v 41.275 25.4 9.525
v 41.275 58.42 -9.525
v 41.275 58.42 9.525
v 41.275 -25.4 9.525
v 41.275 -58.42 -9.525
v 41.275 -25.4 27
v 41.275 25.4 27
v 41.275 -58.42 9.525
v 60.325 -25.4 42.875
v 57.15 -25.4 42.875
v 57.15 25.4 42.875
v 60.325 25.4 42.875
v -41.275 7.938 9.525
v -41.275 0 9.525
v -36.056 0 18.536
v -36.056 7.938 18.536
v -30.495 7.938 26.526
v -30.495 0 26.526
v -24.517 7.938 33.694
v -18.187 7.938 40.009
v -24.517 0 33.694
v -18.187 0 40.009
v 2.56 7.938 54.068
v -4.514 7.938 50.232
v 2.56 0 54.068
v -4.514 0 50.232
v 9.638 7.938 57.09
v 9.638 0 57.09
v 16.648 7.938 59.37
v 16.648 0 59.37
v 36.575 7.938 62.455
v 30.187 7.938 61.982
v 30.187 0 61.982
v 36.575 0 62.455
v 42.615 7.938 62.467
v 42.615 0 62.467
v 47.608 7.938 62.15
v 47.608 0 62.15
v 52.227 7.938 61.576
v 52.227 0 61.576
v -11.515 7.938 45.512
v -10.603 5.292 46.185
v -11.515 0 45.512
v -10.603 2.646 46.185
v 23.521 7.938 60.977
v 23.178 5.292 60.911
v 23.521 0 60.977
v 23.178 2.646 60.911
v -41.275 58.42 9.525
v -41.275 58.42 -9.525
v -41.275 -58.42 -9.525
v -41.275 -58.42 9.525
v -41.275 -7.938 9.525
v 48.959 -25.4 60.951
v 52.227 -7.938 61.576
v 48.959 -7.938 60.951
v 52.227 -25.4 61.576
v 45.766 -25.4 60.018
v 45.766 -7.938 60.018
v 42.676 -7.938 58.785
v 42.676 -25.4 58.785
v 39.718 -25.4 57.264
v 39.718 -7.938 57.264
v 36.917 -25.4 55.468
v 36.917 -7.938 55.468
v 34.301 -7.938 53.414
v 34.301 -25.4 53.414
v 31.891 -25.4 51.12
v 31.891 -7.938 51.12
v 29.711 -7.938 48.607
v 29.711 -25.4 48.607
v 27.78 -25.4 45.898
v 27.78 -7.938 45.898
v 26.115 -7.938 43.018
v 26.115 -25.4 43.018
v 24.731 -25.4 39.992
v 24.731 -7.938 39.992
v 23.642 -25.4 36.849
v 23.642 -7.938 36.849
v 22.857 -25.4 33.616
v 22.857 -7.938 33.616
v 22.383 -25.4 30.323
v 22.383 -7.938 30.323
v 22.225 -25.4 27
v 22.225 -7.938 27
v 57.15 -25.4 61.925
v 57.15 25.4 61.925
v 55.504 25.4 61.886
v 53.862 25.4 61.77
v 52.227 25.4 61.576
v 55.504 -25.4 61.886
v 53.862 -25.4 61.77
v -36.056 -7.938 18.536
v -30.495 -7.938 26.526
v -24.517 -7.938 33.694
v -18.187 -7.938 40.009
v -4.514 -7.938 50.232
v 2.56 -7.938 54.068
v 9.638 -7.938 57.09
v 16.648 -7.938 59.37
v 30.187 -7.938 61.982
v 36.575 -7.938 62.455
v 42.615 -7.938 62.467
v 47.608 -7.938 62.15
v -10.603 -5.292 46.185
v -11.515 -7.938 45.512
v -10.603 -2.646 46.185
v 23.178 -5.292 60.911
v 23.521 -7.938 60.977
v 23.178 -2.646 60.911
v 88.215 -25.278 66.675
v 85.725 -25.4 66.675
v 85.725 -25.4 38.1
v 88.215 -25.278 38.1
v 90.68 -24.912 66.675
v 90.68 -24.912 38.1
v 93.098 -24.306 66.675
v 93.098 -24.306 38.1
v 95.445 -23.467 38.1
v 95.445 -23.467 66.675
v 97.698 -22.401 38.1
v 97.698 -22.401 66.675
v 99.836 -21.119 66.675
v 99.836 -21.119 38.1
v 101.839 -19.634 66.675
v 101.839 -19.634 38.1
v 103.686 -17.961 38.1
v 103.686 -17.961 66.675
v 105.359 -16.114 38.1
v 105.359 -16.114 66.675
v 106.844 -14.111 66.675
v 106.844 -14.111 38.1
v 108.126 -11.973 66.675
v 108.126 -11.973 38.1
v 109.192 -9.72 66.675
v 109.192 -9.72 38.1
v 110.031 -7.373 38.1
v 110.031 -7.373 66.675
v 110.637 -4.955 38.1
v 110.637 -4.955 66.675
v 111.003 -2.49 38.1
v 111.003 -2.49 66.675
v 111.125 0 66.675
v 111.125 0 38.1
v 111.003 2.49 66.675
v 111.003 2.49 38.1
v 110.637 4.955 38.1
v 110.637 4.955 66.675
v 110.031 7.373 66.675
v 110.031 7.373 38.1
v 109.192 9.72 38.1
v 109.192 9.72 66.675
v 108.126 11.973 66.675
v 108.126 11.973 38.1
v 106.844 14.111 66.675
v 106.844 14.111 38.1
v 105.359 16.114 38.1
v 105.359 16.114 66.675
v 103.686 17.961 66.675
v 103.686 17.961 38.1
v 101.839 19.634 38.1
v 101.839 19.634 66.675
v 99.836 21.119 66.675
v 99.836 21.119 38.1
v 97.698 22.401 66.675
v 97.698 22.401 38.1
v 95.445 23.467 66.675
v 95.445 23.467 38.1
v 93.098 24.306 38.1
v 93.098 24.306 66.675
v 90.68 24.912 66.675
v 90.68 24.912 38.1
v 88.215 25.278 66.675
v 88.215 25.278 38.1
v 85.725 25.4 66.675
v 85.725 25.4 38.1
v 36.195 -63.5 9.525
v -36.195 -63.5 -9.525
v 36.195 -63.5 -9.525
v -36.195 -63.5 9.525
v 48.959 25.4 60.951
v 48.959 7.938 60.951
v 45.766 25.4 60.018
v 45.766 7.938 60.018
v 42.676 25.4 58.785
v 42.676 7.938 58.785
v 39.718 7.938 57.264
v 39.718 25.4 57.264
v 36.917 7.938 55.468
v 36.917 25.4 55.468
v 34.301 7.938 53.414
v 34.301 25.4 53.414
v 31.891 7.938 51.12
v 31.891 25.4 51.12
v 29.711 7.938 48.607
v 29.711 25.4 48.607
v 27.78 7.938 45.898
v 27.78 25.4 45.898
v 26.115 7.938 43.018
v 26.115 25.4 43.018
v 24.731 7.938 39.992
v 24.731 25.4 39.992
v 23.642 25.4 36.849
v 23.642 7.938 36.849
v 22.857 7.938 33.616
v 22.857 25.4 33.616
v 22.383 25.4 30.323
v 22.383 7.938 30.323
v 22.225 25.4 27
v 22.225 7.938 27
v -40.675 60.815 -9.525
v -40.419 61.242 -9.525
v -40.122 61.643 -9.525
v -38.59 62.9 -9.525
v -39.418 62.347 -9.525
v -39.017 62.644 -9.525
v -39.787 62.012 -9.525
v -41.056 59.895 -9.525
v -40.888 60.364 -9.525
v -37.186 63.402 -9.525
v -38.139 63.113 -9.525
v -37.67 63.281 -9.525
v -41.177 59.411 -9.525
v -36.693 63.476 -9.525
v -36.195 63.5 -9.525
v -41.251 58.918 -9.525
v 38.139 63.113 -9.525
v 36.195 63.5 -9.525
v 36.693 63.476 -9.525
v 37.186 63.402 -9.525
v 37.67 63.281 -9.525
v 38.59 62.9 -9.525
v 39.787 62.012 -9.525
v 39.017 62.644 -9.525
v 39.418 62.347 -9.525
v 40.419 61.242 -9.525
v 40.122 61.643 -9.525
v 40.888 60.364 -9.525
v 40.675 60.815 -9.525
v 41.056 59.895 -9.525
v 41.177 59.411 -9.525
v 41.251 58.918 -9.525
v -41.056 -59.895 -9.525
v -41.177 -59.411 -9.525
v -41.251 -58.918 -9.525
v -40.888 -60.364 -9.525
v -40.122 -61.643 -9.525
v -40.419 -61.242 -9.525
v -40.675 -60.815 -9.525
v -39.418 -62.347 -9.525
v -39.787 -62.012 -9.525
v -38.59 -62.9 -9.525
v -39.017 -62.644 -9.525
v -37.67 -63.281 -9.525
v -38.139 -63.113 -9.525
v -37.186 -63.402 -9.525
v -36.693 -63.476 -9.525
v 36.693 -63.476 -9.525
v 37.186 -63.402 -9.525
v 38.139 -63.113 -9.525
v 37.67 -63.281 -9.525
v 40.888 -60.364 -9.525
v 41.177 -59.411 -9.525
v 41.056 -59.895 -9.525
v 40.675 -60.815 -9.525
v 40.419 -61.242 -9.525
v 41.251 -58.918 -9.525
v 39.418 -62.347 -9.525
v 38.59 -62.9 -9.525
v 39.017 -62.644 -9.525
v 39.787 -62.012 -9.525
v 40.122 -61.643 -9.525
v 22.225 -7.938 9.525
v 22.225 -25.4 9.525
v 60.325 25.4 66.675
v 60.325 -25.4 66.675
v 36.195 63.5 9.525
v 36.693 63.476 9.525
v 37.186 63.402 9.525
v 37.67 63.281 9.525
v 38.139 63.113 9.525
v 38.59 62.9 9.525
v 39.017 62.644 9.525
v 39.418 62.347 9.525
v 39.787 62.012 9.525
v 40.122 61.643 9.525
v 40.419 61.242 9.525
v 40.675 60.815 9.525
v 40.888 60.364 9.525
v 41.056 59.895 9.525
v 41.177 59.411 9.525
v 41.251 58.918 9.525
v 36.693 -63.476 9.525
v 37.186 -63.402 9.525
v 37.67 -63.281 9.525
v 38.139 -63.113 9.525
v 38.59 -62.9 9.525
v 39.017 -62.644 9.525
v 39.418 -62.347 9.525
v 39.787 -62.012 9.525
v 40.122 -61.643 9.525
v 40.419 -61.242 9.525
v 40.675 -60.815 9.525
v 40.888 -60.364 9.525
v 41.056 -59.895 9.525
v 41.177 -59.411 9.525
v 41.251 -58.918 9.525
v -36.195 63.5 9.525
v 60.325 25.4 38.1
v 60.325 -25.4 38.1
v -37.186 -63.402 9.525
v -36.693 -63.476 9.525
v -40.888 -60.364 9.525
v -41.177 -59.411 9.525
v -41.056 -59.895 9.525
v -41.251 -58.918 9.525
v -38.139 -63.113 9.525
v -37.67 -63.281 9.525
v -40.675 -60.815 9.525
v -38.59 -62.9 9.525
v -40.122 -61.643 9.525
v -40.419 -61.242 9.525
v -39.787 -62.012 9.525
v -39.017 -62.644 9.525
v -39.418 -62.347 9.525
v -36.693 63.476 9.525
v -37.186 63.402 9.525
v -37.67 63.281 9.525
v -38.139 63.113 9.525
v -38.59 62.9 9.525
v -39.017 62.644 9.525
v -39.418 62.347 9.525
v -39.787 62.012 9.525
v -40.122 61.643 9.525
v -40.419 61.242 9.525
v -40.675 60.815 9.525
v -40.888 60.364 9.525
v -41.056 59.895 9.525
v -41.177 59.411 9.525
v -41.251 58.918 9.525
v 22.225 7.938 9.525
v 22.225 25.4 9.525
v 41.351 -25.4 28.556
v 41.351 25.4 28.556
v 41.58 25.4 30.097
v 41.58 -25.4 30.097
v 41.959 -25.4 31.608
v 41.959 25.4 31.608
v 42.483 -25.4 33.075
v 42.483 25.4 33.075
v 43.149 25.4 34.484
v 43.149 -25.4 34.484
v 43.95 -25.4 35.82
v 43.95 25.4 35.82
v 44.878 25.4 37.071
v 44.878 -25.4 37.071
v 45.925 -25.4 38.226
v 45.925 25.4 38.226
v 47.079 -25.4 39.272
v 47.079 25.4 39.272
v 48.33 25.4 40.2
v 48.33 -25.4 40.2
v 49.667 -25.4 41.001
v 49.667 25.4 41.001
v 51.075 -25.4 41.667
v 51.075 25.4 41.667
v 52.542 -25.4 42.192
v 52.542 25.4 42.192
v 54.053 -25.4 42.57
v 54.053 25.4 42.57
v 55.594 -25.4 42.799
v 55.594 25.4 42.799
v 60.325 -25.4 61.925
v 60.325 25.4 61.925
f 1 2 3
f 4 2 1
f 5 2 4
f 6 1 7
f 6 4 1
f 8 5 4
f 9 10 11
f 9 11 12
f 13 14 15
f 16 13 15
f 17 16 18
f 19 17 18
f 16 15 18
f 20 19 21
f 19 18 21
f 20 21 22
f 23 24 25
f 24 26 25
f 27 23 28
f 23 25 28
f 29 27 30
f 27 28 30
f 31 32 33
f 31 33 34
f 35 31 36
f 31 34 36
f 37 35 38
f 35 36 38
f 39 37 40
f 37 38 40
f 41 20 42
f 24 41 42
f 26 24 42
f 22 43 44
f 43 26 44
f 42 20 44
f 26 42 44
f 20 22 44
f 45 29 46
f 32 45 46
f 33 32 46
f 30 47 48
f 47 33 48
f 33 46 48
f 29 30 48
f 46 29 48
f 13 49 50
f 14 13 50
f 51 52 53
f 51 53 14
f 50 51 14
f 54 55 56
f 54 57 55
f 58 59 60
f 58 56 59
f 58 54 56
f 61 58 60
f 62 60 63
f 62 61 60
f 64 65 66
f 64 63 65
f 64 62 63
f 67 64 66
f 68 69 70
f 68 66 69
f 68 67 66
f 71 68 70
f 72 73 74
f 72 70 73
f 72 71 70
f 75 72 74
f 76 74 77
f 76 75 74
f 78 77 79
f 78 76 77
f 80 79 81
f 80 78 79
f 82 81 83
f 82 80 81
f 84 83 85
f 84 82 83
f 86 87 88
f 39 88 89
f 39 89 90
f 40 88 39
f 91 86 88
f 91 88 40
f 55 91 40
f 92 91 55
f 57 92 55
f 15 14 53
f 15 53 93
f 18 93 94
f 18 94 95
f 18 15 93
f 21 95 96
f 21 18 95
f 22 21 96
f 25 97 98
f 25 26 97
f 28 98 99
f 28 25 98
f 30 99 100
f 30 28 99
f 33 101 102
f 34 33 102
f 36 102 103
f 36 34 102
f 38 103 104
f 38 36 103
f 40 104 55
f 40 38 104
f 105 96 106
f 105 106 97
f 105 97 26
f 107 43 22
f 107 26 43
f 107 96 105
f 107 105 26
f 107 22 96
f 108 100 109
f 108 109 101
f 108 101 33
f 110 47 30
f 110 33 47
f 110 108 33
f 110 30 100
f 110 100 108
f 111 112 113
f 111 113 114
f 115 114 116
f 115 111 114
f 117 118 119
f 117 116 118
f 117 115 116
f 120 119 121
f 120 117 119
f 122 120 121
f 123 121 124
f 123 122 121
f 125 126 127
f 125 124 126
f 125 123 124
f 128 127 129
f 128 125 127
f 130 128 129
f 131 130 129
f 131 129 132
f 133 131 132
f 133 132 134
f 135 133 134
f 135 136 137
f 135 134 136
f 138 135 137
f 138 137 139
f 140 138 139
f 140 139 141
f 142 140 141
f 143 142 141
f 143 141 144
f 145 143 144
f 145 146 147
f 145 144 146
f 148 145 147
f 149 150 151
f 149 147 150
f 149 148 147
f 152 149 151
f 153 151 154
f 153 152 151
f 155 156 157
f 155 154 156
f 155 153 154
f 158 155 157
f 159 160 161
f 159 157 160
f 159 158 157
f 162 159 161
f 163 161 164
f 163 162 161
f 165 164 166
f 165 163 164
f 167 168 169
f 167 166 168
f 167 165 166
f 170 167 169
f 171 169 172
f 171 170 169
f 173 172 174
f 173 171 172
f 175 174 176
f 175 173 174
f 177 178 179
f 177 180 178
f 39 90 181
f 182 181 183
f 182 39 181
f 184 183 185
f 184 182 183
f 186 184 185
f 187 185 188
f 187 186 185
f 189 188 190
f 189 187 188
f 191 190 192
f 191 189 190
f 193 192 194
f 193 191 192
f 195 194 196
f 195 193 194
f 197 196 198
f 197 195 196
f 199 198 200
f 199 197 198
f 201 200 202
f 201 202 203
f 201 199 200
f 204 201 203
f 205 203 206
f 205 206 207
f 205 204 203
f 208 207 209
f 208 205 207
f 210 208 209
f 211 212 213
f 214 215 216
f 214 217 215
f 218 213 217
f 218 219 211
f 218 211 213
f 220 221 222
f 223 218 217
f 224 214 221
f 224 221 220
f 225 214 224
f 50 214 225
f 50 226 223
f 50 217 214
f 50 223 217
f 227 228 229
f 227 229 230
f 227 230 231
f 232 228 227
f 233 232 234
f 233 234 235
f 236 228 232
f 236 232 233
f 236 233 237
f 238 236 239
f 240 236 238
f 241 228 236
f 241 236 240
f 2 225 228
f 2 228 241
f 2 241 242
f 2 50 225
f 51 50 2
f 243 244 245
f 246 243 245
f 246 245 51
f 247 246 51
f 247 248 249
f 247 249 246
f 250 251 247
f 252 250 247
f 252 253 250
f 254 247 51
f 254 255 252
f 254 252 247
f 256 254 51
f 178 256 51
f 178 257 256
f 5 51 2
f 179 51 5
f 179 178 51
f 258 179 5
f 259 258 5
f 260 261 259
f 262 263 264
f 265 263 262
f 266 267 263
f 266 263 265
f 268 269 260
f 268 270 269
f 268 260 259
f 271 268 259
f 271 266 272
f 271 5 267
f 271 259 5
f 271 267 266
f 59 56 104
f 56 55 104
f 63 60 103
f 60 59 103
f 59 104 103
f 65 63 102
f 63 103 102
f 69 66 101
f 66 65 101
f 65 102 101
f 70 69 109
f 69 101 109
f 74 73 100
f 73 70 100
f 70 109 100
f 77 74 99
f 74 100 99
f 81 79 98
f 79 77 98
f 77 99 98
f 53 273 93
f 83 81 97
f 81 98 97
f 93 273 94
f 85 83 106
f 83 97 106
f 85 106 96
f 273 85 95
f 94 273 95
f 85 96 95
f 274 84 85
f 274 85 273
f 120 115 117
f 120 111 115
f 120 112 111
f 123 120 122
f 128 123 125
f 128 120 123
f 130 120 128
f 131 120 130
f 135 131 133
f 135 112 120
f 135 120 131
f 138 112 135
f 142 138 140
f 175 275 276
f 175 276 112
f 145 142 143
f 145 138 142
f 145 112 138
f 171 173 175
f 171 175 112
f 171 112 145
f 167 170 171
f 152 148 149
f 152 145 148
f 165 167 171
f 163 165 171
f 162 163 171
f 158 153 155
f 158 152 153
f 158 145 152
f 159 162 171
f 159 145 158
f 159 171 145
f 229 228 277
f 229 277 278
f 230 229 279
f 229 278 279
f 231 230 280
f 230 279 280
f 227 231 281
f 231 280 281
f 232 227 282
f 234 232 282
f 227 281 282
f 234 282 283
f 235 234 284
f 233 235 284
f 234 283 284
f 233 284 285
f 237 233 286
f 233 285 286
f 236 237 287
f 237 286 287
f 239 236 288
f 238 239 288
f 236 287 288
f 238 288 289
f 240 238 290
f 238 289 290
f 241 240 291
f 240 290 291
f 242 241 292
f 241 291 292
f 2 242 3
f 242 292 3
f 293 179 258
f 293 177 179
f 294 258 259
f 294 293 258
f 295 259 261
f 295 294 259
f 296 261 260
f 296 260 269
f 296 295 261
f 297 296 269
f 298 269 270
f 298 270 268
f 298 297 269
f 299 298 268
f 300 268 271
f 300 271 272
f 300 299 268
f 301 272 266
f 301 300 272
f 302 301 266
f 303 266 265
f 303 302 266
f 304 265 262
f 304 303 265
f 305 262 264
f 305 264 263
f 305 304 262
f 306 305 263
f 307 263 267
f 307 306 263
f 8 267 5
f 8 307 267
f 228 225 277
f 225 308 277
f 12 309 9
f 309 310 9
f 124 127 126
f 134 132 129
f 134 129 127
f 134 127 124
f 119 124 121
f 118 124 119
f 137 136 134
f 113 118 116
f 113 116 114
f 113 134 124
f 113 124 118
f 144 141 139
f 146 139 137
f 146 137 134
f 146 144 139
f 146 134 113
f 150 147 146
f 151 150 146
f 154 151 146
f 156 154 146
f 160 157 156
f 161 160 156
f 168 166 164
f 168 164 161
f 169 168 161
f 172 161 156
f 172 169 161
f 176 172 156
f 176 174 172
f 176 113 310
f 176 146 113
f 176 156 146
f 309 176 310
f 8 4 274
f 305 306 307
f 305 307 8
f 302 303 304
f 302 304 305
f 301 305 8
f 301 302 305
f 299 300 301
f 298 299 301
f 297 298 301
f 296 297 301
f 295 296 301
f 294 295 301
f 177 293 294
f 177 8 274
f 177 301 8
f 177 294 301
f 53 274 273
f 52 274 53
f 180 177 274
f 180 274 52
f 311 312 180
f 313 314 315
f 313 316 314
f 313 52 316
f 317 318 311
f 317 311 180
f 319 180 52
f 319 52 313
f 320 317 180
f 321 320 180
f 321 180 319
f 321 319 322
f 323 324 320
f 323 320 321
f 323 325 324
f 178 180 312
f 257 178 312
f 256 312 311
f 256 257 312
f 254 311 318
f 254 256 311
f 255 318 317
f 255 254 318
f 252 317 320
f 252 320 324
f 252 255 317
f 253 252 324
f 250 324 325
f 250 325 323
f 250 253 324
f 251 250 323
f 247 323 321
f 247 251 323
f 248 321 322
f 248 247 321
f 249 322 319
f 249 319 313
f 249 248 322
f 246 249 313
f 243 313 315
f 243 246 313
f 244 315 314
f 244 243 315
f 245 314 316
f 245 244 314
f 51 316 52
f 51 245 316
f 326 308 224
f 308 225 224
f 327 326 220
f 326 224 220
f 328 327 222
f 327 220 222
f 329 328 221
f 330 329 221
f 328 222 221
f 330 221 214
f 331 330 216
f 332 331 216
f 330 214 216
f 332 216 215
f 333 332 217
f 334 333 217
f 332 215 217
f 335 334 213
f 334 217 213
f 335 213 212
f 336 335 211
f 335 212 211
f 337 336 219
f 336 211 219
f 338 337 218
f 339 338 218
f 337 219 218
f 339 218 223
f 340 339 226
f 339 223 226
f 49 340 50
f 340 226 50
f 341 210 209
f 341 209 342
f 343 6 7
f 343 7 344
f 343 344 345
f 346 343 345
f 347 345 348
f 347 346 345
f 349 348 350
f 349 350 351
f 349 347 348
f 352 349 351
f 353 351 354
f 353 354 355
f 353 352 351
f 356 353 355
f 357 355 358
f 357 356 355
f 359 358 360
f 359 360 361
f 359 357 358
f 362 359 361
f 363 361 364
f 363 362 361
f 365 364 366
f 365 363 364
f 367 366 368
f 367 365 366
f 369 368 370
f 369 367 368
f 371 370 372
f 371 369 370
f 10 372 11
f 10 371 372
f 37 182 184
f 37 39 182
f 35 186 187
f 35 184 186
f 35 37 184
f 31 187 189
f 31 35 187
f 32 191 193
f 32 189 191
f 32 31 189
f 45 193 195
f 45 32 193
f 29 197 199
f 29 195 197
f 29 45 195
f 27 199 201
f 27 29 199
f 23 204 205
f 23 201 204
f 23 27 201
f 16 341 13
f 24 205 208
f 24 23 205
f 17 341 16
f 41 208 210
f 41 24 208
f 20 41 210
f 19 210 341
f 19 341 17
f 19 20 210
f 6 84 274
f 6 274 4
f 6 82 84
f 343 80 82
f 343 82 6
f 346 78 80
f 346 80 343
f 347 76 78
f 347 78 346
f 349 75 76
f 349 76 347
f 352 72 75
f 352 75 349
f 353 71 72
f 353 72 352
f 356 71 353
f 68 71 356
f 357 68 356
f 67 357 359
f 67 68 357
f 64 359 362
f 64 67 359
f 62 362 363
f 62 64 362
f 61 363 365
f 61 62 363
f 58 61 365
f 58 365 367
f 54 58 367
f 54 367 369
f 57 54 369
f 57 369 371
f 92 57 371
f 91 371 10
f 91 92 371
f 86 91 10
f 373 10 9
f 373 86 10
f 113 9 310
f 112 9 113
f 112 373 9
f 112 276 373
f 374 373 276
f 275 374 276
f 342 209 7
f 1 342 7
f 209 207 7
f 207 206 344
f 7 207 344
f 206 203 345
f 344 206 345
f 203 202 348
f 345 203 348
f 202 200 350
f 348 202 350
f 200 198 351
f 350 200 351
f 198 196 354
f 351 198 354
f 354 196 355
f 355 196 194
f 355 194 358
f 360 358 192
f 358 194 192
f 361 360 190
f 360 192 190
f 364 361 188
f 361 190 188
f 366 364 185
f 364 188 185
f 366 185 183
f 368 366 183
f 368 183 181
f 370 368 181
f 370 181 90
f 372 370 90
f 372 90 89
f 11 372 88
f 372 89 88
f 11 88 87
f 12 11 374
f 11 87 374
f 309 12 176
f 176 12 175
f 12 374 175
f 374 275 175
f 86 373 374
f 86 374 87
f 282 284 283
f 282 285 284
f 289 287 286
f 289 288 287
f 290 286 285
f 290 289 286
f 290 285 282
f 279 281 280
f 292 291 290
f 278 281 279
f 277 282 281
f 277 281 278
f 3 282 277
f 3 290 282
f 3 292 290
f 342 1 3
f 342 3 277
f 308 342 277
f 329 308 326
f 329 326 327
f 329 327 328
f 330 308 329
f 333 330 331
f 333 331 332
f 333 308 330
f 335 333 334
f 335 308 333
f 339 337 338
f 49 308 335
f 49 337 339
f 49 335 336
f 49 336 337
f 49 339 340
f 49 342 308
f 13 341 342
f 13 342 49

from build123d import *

# Parameters (mm, degrees)
F1_DEPTH = 63.5
F0_W     = 25.4
F0_H     = 19.05
F0_H_2   = 4.7498
F0_H_3   = 4.7752
F2_DEPTH = 25.4
F3_DEPTH = 7.9375
F5_R     = 5.08


with BuildPart() as f1:
    # F0 (on Front) → F1 (new body, symmetric)
    with BuildSketch(Plane.XZ):
        Polygon((22.225, 9.525), (-41.275, 9.525), (-41.275, -9.525), (41.275, -9.525), (41.275, 9.525), align=None)
    extrude(amount=F1_DEPTH, both=True)

    # F0 (on Front) → F2 (join, symmetric)
    with BuildSketch(Plane.XZ):
        with BuildLine():
            Line((22.225, 27.0002), (22.225, 9.525))
            Line((22.225, 9.525), (41.275, 9.525))
            Line((41.275, 9.525), (41.275, 27.0002))
            ThreePointArc((41.275, 27.0002), (45.9246798487, 38.2255201513), (57.15, 42.8752))
            Line((57.15, 42.8752), (60.325, 42.8752))
            Line((60.325, 42.8752), (60.325, 61.9252))
            Line((60.325, 61.9252), (57.15, 61.9252))
            ThreePointArc((57.15, 61.9252), (54.6822905468, 61.8379099571), (52.2269164674, 61.5764761663))
            ThreePointArc((52.2269164674, 61.5764761663), (30.77108496, 49.8892468633), (22.225, 27.0002))
        make_face()
        with Locations((73.025, 52.4002)):
            Rectangle(F0_W, F0_H)
        with Locations((73.025, 64.3001)):
            Rectangle(F0_W, F0_H_2)
        with Locations((73.025, 40.4876)):
            Rectangle(F0_W, F0_H_3)
    extrude(amount=F2_DEPTH, both=True)

    # F0 (on Front) → F3 (join, symmetric)
    with BuildSketch(Plane.XZ):
        with BuildLine():
            add(Edge.make_bspline(
                [(-41.275, 9.525), (-14.7710740566, 59.7766935825), (28.1573608518, 65.3158426285), (52.2269164674, 61.5764761663)],
                knots=[0, 0, 0, 0, 107.0138521602, 107.0138521602, 107.0138521602, 107.0138521602], degree=3))
            Line((-41.275, 9.525), (22.225, 9.525))
            Line((22.225, 9.525), (22.225, 27.0002))
            ThreePointArc((22.225, 27.0002), (30.77108496, 49.8892468633), (52.2269164674, 61.5764761663))
        make_face()
    extrude(amount=F3_DEPTH, both=True)

    # F0 (on Front) → F4 (revolve)
    with BuildSketch(Plane.XZ):
        Polygon((85.725, 66.675), (85.725, 61.9252), (85.725, 42.8752), (85.725, 38.1), (111.125, 38.1), (111.125, 66.675), align=None)
    revolve(axis=Axis((85.725, 0, 52.3875), (0, 0, 1)))

    # F5
    f5_edges = [f1.edges().sort_by_distance(p)[0] for p in [
        (41.275, 63.5, 0),
        (41.275, -63.5, 0),
        (-41.275, -63.5, 0),
        (-41.275, 63.5, 0),
    ]]
    fillet(f5_edges, radius=F5_R)


solid = f1.part
